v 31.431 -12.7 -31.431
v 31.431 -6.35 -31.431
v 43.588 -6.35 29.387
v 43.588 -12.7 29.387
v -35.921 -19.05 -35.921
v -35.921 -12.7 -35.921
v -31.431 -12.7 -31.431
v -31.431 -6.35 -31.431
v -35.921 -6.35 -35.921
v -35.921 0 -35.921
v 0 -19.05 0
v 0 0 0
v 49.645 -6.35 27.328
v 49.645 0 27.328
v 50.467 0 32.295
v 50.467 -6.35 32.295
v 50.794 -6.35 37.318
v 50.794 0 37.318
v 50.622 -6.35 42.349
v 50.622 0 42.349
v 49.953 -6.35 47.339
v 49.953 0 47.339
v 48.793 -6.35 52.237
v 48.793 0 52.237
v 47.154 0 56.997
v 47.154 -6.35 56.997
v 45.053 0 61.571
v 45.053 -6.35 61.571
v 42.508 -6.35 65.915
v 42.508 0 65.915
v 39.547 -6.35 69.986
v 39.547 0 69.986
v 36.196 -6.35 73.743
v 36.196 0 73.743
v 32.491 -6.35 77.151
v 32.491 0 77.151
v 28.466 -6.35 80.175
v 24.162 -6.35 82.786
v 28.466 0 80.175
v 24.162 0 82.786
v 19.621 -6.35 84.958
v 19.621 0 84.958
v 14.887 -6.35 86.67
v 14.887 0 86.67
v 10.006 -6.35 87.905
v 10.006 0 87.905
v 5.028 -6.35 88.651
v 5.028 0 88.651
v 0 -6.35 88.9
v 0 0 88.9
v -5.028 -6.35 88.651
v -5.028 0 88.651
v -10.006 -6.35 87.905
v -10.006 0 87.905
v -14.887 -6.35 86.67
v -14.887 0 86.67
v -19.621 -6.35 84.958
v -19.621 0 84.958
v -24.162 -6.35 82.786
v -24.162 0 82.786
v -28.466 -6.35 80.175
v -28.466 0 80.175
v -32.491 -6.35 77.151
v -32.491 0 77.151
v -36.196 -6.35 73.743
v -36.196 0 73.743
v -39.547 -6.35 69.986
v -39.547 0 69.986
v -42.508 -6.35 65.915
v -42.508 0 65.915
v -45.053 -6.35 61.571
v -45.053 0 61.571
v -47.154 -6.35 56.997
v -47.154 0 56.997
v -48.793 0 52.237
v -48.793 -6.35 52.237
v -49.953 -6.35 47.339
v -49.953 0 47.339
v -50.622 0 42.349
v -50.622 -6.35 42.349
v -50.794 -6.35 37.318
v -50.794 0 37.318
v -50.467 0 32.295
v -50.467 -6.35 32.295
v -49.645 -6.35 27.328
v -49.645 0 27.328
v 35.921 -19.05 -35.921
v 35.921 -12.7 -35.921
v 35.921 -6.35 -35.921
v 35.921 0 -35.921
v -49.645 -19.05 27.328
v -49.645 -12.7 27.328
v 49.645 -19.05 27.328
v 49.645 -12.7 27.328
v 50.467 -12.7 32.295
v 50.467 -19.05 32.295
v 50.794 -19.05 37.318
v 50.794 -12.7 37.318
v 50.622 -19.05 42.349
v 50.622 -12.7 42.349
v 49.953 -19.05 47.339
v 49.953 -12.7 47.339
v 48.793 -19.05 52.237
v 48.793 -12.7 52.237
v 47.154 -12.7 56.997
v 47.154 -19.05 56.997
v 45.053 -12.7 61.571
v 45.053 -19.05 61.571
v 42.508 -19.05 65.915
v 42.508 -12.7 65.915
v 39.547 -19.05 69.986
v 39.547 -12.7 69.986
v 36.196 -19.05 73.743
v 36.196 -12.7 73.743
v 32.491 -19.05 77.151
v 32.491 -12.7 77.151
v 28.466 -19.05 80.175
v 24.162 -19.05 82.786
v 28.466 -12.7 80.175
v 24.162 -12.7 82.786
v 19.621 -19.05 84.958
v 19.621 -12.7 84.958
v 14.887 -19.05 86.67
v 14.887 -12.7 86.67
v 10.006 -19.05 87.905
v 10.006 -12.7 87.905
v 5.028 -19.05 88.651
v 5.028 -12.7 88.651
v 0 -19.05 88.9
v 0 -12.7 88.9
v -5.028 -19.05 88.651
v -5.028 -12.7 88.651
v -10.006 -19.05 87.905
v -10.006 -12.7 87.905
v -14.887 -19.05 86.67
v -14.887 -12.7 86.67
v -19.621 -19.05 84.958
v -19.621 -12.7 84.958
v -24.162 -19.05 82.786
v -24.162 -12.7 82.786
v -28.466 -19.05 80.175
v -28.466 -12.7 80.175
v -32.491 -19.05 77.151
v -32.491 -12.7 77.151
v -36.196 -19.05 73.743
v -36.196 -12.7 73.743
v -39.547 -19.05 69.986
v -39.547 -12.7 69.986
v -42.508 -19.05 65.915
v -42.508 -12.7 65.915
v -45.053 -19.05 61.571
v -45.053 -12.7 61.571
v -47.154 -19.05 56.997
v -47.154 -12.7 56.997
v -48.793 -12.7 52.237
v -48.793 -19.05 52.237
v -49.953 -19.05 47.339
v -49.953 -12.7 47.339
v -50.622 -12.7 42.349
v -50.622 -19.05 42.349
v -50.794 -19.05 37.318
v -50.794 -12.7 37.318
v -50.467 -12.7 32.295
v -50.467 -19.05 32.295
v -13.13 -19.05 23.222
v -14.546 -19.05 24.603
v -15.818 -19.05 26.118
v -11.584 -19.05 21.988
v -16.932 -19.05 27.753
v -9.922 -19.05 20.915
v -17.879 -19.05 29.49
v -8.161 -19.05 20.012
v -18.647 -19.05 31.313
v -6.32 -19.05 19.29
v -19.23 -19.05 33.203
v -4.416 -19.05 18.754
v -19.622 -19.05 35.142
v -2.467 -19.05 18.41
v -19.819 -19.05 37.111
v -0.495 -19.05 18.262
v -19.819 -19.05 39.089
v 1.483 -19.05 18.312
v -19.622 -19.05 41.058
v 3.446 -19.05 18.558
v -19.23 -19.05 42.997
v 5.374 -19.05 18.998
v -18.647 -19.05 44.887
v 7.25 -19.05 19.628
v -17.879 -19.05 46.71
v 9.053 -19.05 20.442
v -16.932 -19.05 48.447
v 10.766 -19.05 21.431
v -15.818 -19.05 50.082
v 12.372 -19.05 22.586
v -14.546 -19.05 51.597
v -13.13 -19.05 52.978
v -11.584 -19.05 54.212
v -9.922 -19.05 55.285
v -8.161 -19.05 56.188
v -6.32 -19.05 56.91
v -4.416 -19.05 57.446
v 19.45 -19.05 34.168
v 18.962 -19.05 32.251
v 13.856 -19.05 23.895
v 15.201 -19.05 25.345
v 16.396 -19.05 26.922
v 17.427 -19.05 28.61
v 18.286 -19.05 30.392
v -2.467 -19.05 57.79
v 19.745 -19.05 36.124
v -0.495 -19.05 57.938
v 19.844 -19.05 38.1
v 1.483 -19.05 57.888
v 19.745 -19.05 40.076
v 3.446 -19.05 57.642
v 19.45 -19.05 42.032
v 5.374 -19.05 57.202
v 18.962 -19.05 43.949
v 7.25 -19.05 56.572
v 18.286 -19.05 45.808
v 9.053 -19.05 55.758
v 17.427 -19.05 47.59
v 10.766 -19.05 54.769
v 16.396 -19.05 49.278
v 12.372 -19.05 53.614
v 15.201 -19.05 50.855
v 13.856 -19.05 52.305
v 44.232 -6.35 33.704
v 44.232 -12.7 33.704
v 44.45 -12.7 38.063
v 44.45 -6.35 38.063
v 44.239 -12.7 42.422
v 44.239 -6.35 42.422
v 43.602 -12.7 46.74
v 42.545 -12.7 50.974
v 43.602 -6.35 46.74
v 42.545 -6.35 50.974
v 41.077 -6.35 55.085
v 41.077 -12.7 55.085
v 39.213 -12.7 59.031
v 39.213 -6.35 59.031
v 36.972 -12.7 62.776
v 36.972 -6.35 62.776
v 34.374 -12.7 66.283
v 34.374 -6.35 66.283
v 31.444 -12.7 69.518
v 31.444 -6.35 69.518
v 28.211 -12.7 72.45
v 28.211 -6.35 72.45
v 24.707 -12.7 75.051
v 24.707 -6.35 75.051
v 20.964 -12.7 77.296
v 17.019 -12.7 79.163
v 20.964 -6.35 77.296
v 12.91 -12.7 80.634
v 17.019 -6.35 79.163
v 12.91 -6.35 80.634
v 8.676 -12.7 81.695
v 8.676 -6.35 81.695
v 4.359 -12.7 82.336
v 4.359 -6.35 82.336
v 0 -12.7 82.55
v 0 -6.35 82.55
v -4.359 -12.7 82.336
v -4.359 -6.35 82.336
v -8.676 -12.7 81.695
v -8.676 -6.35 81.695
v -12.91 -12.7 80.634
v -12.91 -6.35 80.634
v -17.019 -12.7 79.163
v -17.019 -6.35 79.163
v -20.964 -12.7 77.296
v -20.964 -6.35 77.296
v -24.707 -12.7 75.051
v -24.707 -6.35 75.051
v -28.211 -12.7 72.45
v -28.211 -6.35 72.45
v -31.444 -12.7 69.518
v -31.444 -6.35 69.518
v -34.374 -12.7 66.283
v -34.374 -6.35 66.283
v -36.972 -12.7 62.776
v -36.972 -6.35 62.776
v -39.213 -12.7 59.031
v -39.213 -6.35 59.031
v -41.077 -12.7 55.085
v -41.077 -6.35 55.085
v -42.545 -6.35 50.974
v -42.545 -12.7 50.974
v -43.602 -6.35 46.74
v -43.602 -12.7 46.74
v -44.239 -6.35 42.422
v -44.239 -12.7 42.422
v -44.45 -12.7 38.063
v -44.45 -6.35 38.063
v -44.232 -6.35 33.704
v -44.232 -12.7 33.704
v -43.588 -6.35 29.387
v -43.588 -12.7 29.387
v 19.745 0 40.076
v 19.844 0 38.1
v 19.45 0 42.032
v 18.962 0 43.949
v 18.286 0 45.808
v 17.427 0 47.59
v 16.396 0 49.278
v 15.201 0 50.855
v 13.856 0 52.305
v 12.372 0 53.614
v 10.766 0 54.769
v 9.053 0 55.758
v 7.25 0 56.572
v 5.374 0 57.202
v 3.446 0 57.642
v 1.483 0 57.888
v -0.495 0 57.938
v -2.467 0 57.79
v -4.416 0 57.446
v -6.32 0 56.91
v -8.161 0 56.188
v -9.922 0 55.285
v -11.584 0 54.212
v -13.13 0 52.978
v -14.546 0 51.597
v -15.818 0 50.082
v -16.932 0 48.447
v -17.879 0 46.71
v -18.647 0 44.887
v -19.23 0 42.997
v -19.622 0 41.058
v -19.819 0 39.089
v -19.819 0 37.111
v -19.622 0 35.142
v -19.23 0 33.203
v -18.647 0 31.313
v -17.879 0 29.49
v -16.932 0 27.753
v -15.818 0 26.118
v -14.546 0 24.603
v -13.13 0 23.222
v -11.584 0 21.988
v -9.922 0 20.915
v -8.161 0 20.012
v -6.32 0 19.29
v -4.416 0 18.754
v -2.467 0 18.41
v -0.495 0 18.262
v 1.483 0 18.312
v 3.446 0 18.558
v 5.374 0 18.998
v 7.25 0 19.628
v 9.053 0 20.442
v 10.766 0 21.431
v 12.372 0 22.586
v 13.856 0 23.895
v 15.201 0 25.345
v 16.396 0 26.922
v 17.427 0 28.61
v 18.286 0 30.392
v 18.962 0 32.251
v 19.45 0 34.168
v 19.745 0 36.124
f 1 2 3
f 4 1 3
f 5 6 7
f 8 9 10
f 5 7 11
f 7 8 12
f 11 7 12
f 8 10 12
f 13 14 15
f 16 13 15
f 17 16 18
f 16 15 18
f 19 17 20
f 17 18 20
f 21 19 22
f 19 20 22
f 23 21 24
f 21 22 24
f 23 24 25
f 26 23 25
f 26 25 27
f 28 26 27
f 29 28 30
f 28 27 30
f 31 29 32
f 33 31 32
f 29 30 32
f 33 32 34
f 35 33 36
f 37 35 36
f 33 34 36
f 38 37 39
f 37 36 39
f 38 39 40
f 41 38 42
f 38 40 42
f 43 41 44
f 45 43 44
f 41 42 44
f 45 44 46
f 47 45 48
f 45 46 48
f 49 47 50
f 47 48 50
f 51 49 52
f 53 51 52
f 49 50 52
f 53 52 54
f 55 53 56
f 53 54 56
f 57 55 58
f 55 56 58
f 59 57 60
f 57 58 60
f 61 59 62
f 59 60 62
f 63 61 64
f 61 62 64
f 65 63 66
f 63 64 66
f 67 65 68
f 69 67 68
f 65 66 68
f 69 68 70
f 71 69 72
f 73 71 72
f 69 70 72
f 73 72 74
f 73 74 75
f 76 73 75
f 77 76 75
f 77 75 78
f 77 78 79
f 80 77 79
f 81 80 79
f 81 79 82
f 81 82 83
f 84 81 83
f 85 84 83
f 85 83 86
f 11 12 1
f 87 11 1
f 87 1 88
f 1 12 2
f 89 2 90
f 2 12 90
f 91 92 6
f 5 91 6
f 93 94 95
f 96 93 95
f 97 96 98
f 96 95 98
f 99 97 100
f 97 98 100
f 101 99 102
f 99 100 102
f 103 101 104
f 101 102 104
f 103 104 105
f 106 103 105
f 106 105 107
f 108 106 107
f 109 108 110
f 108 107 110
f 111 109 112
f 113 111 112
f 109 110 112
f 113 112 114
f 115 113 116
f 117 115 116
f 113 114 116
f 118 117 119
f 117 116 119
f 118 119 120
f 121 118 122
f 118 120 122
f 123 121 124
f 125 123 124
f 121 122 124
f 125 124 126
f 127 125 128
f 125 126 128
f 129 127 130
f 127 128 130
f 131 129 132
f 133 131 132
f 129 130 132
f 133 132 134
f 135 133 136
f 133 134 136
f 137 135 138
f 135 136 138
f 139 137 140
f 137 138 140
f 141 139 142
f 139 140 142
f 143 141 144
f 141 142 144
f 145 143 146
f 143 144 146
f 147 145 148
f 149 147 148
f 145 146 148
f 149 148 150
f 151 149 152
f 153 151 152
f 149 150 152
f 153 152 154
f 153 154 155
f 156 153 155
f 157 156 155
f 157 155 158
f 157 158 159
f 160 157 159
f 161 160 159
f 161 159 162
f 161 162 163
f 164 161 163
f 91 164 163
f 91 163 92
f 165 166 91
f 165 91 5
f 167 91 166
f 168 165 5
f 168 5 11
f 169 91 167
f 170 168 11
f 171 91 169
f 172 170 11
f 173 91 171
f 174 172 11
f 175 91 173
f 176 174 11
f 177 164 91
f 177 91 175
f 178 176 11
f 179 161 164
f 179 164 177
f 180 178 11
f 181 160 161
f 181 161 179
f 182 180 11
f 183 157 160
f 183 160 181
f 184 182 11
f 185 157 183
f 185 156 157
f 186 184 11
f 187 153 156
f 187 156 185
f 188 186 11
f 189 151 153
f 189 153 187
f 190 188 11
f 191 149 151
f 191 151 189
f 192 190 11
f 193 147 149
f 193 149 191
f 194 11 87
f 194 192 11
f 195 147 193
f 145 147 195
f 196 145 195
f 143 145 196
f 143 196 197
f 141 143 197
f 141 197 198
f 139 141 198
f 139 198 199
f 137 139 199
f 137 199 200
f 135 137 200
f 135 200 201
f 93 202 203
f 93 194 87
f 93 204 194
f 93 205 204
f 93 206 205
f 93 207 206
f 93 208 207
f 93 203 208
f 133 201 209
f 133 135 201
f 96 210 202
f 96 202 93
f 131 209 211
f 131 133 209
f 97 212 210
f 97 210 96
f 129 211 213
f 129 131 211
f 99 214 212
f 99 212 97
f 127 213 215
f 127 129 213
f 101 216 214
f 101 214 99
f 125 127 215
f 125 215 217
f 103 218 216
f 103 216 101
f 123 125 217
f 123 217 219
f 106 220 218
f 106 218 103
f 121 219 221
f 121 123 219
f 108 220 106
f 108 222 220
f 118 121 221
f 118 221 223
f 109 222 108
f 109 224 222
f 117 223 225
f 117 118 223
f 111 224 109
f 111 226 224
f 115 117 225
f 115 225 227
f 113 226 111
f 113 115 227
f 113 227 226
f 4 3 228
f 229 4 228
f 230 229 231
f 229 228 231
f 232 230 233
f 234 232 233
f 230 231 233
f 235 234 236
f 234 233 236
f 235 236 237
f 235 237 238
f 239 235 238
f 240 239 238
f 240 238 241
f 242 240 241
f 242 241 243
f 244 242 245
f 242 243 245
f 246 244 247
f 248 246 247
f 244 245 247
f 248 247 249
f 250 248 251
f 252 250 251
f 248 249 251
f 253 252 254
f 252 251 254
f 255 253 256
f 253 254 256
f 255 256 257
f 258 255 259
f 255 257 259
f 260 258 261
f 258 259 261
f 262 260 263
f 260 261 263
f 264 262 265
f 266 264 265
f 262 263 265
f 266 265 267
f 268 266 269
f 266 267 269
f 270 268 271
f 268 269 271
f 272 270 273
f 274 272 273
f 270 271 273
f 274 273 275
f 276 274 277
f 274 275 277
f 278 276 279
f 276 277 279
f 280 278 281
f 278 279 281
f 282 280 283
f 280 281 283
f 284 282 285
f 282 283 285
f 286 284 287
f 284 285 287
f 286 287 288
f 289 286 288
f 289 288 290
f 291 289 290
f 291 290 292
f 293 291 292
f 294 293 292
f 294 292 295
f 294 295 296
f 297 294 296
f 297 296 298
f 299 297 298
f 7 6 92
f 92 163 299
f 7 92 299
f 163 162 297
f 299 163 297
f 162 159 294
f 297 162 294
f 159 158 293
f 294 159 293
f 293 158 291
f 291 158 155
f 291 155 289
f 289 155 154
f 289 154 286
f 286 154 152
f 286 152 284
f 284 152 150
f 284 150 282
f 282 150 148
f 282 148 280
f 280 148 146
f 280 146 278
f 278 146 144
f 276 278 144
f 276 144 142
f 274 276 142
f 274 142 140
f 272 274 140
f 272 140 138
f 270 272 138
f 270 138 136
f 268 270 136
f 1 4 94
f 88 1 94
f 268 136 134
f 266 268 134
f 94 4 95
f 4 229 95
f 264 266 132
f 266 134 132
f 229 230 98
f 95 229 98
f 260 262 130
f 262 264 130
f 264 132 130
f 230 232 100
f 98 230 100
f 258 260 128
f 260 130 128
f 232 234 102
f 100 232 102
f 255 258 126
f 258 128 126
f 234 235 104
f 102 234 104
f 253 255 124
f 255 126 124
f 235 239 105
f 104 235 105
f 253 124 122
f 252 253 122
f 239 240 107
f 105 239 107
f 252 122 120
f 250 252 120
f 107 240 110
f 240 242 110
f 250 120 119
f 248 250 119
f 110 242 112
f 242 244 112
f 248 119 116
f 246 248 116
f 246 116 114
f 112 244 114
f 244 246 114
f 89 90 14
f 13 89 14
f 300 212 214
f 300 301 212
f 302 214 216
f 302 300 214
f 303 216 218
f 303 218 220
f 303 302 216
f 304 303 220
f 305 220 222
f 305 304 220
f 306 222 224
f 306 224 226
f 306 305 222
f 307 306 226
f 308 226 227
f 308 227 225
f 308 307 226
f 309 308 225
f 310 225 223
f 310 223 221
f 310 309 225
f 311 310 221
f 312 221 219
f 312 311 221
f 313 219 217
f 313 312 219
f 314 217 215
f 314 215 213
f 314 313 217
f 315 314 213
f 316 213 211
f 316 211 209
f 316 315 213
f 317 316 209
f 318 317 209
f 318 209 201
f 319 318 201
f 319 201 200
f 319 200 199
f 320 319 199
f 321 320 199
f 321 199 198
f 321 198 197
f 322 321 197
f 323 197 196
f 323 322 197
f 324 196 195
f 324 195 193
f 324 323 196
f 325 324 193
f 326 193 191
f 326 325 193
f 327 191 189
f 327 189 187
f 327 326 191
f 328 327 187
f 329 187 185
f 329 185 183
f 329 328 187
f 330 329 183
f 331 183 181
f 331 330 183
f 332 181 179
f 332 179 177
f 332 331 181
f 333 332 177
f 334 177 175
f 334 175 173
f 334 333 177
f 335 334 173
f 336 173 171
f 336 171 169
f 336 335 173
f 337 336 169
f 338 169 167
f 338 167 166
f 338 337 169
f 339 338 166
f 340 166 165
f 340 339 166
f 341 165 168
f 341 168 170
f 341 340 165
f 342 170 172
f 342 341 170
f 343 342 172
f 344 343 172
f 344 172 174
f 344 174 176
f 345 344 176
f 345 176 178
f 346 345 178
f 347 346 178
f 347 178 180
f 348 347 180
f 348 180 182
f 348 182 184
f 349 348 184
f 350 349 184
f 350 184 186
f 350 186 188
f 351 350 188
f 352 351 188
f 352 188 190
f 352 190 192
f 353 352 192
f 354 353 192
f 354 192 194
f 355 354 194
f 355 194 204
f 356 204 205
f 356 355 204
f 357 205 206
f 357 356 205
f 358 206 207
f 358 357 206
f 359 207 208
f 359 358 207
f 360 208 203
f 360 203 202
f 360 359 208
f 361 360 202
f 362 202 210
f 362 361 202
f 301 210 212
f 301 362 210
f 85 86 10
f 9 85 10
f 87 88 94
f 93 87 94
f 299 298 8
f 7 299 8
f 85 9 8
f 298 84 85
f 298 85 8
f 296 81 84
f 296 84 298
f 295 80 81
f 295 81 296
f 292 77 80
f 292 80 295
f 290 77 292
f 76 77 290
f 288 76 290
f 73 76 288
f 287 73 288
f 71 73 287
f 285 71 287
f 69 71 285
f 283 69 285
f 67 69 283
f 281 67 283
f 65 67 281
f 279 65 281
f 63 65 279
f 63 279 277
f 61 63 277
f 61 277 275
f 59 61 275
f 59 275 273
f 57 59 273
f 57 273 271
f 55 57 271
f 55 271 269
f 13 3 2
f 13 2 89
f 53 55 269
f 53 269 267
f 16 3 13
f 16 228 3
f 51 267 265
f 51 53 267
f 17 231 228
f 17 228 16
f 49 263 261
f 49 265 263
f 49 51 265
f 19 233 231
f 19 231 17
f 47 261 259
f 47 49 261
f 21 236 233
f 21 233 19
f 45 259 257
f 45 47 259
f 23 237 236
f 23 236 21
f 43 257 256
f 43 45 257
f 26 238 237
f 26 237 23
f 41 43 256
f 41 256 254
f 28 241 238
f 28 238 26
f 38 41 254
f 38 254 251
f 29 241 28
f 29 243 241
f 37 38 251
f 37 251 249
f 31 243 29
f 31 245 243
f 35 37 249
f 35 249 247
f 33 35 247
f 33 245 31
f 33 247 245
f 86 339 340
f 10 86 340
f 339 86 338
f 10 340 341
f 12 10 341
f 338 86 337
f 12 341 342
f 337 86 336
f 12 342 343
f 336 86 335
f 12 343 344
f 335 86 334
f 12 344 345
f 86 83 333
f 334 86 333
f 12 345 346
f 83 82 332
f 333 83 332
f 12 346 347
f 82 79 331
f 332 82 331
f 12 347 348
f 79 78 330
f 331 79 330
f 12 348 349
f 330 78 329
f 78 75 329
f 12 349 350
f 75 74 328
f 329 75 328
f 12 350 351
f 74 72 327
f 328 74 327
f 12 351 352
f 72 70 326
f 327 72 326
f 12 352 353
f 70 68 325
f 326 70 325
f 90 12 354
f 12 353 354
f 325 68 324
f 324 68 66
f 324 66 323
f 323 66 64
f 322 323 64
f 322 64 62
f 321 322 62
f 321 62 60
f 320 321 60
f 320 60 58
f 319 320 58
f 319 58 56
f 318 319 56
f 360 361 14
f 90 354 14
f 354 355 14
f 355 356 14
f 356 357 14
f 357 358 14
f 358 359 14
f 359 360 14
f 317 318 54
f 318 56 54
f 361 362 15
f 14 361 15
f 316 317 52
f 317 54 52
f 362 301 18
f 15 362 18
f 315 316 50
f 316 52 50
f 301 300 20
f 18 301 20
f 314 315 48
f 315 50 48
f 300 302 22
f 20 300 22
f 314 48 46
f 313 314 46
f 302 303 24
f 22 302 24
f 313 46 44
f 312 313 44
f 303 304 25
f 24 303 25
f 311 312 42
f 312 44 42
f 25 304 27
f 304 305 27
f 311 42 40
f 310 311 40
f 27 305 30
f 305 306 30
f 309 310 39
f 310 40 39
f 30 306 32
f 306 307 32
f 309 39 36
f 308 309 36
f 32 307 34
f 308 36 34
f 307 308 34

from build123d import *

# Parameters (mm, degrees)
SKETCH_R            = 19.84375
PAD_DEPTH           = 6.35
SKETCH001_R         = 19.84375
PAD001_DEPTH        = 6.35
LINEARPATTERN_COUNT = 2
LINEARPATTERN_PITCH = 12.7


with BuildPart() as part:
    # Sketch → Pad (new body)
    with BuildSketch(Plane.XZ):
        with BuildLine():
            ThreePointArc((49.644797, 27.328087), (0, 88.9), (-49.644797, 27.328087))
            Line((-49.644797, 27.328087), (-35.921024, -35.921024))
            Line((-35.921024, -35.921024), (0, 0))
            Line((0, 0), (35.921024, -35.921024))
            Line((35.921024, -35.921024), (49.644797, 27.328087))
        make_face()
        with Locations((0, 38.1)):
            Circle(SKETCH_R, mode=Mode.SUBTRACT)
    pad = extrude(amount=PAD_DEPTH)

    # Sketch001 (on DatumPlane) → Pad001 (join)
    with BuildSketch(Plane.XZ.offset(6.35)):
        with BuildLine():
            ThreePointArc((43.587747, 29.387319), (0, 82.55), (-43.587747, 29.387319))
            Line((-43.587747, 29.387319), (-31.430896, -31.430896))
            Line((-31.430896, -31.430896), (0, 0))
            Line((0, 0), (31.430896, -31.430896))
            Line((31.430896, -31.430896), (43.587747, 29.387319))
        make_face()
        with Locations((0, 38.1)):
            Circle(SKETCH001_R, mode=Mode.SUBTRACT)
    extrude(amount=PAD001_DEPTH)

    # LinearPattern: Pad ×2
    with Locations(*[(0, -i * LINEARPATTERN_PITCH, 0) for i in range(1, LINEARPATTERN_COUNT)]):
        add(pad)


solid = part.part
